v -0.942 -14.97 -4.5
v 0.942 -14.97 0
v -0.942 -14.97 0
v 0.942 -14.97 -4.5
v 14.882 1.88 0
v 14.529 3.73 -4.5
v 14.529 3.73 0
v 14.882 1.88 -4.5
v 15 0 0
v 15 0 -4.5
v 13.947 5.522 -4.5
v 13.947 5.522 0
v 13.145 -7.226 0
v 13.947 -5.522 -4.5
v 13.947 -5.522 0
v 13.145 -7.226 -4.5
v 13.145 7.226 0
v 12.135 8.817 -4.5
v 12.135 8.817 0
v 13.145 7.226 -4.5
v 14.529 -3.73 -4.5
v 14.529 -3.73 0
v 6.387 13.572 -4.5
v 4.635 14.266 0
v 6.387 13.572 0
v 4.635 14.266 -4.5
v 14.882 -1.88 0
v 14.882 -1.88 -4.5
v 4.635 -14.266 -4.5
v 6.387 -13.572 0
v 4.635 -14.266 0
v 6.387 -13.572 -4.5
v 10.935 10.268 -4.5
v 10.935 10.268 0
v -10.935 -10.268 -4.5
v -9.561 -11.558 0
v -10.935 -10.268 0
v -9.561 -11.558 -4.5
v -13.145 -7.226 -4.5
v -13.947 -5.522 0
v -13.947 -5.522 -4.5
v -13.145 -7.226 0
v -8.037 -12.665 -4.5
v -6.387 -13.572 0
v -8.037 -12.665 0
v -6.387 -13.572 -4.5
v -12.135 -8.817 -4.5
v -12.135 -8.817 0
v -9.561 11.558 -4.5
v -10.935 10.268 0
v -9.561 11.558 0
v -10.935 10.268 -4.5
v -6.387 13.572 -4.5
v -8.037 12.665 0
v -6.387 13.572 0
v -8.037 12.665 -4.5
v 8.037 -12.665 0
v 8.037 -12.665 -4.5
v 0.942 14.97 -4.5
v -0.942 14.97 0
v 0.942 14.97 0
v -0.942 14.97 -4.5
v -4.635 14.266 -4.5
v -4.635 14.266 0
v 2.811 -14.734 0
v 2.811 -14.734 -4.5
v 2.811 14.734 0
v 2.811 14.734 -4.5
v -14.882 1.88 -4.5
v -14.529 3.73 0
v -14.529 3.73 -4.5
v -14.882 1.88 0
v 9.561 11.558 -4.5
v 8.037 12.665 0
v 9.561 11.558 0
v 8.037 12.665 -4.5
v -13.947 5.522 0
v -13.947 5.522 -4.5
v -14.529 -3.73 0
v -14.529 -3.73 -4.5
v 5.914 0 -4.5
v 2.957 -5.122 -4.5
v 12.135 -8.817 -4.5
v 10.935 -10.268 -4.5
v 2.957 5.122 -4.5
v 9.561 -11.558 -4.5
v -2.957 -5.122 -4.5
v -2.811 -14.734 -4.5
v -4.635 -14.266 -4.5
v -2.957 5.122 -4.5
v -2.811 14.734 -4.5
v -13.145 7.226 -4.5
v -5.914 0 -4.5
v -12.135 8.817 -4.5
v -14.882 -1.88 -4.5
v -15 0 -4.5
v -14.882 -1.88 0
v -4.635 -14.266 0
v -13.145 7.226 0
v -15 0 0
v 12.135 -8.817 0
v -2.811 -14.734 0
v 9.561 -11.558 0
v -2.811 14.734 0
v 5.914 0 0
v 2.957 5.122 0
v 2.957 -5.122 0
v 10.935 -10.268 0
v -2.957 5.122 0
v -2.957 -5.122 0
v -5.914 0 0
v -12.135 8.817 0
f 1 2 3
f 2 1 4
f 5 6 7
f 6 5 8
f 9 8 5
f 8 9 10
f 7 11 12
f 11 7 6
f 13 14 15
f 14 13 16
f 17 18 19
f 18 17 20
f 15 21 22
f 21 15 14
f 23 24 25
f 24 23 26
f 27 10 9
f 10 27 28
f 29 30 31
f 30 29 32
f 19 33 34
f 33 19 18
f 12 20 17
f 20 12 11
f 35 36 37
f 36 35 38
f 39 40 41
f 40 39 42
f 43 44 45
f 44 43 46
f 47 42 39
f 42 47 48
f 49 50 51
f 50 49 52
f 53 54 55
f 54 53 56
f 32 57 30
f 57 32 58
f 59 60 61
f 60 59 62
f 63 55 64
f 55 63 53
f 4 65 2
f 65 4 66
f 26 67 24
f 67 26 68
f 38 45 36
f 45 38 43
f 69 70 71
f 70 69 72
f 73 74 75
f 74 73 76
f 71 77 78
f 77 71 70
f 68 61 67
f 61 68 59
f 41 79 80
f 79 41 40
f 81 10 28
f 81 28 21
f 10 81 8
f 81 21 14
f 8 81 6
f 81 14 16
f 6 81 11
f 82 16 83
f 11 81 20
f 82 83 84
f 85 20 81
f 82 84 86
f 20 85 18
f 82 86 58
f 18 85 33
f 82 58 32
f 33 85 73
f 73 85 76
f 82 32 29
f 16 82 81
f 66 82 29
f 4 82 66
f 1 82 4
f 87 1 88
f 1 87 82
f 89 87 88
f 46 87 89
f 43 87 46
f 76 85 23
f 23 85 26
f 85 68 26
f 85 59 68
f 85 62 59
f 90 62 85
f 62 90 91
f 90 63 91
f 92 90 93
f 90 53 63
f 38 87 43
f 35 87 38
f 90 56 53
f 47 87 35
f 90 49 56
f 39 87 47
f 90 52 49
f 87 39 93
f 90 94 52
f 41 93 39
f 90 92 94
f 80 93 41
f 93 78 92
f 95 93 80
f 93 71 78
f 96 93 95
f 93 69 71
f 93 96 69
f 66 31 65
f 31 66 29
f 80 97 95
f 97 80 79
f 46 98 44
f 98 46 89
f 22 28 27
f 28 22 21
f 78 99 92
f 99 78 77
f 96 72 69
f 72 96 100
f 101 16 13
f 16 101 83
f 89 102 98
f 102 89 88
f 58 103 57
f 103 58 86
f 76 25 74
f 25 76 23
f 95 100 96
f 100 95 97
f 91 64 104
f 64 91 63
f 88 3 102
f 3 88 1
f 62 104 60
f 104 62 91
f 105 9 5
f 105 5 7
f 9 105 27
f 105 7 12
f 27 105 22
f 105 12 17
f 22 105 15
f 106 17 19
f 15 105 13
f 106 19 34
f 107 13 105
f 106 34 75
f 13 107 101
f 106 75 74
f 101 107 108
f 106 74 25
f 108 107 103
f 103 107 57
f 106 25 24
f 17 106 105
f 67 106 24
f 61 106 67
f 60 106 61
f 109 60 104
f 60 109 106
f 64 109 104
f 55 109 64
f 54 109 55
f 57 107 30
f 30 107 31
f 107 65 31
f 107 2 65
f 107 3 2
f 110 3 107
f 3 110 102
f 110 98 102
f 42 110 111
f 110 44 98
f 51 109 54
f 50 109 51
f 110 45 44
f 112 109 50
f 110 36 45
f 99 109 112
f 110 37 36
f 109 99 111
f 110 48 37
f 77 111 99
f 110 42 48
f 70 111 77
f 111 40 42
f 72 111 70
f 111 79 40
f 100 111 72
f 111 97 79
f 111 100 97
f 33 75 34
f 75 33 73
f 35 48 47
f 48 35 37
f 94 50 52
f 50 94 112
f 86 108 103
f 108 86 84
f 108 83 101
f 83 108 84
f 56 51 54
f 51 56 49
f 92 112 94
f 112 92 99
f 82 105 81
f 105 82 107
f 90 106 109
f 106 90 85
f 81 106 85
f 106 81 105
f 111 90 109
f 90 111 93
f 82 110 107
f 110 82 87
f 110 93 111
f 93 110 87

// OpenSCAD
$fn = 50;


difference() {
	union() {
		translate(v = [0, 0, -4.5000000000]) {
			cylinder(h = 4.5000000000, r = 15.0000000000);
		}
		translate(v = [0, 0, -3.0000000000]) {
			cylinder(h = 3, r = 2.8750000000);
		}
	}
	union() {
		translate(v = [0, 0, 0]) {
			rotate(a = [0, 0, 0]) {
				difference() {
					union() {
						translate(v = [0, 0, -5]) {
							linear_extrude(height = 5) {
								polygon(points = [[5.9142500000, 0.0000000000], [2.9571250000, 5.1218907443], [-2.9571250000, 5.1218907443], [-5.9142500000, 0.0000000000], [-2.9571250000, -5.1218907443], [2.9571250000, -5.1218907443]]);
							}
						}
					}
					union();
				}
			}
		}
		#translate(v = [0, 0, -100.0000000000]) {
			cylinder(h = 200, r = 3.2500000000);
		}
	}
}
